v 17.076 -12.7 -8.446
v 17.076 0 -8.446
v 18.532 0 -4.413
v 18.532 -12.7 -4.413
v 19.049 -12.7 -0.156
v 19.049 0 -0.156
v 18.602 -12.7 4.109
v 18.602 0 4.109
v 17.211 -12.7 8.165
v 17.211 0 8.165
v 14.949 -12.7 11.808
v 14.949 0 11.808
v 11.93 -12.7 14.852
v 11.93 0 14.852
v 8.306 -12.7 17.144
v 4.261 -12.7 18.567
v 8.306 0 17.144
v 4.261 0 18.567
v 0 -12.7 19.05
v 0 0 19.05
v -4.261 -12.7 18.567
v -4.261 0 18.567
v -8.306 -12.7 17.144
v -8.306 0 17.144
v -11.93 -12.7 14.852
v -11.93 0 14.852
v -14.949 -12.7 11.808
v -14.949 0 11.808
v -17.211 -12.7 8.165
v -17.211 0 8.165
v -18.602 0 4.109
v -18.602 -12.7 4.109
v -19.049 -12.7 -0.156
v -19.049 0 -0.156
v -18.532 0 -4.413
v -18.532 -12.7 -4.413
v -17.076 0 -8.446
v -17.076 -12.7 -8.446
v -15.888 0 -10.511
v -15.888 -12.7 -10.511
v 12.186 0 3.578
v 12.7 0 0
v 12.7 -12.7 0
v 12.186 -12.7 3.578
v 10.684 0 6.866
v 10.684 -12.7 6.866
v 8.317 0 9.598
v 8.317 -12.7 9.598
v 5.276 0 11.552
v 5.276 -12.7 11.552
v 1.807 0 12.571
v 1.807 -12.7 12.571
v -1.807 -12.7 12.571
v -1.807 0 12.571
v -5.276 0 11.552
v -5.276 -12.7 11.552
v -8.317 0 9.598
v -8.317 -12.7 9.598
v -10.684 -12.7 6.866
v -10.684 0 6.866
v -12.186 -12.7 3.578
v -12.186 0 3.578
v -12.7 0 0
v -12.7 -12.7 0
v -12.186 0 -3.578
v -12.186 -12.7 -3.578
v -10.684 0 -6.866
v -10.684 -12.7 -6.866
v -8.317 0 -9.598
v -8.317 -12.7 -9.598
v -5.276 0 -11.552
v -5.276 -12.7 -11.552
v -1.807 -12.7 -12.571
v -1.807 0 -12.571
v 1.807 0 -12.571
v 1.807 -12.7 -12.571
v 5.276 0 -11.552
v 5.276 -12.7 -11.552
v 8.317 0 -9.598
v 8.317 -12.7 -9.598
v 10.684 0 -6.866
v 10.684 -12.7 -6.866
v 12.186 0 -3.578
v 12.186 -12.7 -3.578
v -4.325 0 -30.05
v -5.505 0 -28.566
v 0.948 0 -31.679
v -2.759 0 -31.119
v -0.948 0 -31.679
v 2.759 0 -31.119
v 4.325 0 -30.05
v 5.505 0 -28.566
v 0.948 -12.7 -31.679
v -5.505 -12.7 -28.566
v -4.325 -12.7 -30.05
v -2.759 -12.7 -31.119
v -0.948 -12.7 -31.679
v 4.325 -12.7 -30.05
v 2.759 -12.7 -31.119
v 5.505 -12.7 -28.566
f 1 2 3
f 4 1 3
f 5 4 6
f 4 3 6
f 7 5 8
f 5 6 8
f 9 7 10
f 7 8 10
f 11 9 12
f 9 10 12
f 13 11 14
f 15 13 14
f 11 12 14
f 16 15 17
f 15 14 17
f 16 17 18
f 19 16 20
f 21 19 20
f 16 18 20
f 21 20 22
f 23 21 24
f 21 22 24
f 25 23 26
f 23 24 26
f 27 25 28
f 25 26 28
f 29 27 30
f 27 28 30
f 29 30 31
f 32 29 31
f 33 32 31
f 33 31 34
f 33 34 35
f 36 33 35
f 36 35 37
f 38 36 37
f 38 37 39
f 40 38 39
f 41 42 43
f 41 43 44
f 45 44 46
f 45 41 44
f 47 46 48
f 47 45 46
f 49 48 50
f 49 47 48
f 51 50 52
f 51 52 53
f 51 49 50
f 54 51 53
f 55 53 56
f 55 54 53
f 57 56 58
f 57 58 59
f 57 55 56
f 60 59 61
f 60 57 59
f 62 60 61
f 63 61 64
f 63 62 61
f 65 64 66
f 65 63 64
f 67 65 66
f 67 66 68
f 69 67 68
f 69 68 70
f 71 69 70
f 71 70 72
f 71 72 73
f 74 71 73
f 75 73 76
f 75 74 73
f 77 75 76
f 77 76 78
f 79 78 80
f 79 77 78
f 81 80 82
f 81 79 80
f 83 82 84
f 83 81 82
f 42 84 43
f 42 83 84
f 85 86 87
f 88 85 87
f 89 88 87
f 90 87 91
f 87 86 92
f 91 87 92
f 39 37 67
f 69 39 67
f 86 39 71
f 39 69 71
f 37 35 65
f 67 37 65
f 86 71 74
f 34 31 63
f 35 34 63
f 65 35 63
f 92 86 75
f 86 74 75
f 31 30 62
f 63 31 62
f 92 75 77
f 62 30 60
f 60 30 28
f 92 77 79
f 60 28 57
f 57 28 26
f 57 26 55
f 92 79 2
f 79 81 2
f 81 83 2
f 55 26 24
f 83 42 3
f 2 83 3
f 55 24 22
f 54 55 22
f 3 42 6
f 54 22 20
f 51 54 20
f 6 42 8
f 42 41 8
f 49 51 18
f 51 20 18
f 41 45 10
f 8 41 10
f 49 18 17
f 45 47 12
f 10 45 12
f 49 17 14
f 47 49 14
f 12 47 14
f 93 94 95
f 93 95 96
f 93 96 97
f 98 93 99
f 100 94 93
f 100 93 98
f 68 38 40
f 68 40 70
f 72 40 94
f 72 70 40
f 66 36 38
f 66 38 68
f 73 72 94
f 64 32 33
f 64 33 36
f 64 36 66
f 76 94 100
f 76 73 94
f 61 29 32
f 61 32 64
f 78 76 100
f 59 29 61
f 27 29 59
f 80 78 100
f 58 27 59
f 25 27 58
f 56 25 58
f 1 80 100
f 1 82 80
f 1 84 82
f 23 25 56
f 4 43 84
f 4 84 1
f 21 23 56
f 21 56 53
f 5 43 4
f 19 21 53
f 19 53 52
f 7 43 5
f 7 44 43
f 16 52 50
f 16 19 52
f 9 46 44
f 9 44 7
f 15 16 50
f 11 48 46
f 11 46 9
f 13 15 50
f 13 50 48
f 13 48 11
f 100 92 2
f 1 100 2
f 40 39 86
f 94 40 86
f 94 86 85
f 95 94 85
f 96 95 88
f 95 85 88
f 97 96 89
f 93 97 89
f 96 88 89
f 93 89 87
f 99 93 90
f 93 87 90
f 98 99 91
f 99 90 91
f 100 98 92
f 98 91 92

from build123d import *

# Parameters (mm, degrees)
F0_R     = 12.7
F1_DEPTH = 12.7


with BuildPart() as f1:
    # F0 (on Front) → F1 (new body)
    with BuildSketch(Plane.XZ):
        with BuildLine():
            Line((-15.887629, -10.51122), (-5.504633, -28.565677))
            ThreePointArc((-5.504633, -28.565677), (0, -31.75), (5.504633, -28.565677))
            Line((5.504633, -28.565677), (17.075518, -8.445661))
            ThreePointArc((17.075518, -8.445661), (0, 19.05), (-17.075518, -8.445661))
            Line((-17.075518, -8.445661), (-15.887629, -10.51122))
        make_face()
        Circle(F0_R, mode=Mode.SUBTRACT)
    extrude(amount=F1_DEPTH)


solid = f1.part
